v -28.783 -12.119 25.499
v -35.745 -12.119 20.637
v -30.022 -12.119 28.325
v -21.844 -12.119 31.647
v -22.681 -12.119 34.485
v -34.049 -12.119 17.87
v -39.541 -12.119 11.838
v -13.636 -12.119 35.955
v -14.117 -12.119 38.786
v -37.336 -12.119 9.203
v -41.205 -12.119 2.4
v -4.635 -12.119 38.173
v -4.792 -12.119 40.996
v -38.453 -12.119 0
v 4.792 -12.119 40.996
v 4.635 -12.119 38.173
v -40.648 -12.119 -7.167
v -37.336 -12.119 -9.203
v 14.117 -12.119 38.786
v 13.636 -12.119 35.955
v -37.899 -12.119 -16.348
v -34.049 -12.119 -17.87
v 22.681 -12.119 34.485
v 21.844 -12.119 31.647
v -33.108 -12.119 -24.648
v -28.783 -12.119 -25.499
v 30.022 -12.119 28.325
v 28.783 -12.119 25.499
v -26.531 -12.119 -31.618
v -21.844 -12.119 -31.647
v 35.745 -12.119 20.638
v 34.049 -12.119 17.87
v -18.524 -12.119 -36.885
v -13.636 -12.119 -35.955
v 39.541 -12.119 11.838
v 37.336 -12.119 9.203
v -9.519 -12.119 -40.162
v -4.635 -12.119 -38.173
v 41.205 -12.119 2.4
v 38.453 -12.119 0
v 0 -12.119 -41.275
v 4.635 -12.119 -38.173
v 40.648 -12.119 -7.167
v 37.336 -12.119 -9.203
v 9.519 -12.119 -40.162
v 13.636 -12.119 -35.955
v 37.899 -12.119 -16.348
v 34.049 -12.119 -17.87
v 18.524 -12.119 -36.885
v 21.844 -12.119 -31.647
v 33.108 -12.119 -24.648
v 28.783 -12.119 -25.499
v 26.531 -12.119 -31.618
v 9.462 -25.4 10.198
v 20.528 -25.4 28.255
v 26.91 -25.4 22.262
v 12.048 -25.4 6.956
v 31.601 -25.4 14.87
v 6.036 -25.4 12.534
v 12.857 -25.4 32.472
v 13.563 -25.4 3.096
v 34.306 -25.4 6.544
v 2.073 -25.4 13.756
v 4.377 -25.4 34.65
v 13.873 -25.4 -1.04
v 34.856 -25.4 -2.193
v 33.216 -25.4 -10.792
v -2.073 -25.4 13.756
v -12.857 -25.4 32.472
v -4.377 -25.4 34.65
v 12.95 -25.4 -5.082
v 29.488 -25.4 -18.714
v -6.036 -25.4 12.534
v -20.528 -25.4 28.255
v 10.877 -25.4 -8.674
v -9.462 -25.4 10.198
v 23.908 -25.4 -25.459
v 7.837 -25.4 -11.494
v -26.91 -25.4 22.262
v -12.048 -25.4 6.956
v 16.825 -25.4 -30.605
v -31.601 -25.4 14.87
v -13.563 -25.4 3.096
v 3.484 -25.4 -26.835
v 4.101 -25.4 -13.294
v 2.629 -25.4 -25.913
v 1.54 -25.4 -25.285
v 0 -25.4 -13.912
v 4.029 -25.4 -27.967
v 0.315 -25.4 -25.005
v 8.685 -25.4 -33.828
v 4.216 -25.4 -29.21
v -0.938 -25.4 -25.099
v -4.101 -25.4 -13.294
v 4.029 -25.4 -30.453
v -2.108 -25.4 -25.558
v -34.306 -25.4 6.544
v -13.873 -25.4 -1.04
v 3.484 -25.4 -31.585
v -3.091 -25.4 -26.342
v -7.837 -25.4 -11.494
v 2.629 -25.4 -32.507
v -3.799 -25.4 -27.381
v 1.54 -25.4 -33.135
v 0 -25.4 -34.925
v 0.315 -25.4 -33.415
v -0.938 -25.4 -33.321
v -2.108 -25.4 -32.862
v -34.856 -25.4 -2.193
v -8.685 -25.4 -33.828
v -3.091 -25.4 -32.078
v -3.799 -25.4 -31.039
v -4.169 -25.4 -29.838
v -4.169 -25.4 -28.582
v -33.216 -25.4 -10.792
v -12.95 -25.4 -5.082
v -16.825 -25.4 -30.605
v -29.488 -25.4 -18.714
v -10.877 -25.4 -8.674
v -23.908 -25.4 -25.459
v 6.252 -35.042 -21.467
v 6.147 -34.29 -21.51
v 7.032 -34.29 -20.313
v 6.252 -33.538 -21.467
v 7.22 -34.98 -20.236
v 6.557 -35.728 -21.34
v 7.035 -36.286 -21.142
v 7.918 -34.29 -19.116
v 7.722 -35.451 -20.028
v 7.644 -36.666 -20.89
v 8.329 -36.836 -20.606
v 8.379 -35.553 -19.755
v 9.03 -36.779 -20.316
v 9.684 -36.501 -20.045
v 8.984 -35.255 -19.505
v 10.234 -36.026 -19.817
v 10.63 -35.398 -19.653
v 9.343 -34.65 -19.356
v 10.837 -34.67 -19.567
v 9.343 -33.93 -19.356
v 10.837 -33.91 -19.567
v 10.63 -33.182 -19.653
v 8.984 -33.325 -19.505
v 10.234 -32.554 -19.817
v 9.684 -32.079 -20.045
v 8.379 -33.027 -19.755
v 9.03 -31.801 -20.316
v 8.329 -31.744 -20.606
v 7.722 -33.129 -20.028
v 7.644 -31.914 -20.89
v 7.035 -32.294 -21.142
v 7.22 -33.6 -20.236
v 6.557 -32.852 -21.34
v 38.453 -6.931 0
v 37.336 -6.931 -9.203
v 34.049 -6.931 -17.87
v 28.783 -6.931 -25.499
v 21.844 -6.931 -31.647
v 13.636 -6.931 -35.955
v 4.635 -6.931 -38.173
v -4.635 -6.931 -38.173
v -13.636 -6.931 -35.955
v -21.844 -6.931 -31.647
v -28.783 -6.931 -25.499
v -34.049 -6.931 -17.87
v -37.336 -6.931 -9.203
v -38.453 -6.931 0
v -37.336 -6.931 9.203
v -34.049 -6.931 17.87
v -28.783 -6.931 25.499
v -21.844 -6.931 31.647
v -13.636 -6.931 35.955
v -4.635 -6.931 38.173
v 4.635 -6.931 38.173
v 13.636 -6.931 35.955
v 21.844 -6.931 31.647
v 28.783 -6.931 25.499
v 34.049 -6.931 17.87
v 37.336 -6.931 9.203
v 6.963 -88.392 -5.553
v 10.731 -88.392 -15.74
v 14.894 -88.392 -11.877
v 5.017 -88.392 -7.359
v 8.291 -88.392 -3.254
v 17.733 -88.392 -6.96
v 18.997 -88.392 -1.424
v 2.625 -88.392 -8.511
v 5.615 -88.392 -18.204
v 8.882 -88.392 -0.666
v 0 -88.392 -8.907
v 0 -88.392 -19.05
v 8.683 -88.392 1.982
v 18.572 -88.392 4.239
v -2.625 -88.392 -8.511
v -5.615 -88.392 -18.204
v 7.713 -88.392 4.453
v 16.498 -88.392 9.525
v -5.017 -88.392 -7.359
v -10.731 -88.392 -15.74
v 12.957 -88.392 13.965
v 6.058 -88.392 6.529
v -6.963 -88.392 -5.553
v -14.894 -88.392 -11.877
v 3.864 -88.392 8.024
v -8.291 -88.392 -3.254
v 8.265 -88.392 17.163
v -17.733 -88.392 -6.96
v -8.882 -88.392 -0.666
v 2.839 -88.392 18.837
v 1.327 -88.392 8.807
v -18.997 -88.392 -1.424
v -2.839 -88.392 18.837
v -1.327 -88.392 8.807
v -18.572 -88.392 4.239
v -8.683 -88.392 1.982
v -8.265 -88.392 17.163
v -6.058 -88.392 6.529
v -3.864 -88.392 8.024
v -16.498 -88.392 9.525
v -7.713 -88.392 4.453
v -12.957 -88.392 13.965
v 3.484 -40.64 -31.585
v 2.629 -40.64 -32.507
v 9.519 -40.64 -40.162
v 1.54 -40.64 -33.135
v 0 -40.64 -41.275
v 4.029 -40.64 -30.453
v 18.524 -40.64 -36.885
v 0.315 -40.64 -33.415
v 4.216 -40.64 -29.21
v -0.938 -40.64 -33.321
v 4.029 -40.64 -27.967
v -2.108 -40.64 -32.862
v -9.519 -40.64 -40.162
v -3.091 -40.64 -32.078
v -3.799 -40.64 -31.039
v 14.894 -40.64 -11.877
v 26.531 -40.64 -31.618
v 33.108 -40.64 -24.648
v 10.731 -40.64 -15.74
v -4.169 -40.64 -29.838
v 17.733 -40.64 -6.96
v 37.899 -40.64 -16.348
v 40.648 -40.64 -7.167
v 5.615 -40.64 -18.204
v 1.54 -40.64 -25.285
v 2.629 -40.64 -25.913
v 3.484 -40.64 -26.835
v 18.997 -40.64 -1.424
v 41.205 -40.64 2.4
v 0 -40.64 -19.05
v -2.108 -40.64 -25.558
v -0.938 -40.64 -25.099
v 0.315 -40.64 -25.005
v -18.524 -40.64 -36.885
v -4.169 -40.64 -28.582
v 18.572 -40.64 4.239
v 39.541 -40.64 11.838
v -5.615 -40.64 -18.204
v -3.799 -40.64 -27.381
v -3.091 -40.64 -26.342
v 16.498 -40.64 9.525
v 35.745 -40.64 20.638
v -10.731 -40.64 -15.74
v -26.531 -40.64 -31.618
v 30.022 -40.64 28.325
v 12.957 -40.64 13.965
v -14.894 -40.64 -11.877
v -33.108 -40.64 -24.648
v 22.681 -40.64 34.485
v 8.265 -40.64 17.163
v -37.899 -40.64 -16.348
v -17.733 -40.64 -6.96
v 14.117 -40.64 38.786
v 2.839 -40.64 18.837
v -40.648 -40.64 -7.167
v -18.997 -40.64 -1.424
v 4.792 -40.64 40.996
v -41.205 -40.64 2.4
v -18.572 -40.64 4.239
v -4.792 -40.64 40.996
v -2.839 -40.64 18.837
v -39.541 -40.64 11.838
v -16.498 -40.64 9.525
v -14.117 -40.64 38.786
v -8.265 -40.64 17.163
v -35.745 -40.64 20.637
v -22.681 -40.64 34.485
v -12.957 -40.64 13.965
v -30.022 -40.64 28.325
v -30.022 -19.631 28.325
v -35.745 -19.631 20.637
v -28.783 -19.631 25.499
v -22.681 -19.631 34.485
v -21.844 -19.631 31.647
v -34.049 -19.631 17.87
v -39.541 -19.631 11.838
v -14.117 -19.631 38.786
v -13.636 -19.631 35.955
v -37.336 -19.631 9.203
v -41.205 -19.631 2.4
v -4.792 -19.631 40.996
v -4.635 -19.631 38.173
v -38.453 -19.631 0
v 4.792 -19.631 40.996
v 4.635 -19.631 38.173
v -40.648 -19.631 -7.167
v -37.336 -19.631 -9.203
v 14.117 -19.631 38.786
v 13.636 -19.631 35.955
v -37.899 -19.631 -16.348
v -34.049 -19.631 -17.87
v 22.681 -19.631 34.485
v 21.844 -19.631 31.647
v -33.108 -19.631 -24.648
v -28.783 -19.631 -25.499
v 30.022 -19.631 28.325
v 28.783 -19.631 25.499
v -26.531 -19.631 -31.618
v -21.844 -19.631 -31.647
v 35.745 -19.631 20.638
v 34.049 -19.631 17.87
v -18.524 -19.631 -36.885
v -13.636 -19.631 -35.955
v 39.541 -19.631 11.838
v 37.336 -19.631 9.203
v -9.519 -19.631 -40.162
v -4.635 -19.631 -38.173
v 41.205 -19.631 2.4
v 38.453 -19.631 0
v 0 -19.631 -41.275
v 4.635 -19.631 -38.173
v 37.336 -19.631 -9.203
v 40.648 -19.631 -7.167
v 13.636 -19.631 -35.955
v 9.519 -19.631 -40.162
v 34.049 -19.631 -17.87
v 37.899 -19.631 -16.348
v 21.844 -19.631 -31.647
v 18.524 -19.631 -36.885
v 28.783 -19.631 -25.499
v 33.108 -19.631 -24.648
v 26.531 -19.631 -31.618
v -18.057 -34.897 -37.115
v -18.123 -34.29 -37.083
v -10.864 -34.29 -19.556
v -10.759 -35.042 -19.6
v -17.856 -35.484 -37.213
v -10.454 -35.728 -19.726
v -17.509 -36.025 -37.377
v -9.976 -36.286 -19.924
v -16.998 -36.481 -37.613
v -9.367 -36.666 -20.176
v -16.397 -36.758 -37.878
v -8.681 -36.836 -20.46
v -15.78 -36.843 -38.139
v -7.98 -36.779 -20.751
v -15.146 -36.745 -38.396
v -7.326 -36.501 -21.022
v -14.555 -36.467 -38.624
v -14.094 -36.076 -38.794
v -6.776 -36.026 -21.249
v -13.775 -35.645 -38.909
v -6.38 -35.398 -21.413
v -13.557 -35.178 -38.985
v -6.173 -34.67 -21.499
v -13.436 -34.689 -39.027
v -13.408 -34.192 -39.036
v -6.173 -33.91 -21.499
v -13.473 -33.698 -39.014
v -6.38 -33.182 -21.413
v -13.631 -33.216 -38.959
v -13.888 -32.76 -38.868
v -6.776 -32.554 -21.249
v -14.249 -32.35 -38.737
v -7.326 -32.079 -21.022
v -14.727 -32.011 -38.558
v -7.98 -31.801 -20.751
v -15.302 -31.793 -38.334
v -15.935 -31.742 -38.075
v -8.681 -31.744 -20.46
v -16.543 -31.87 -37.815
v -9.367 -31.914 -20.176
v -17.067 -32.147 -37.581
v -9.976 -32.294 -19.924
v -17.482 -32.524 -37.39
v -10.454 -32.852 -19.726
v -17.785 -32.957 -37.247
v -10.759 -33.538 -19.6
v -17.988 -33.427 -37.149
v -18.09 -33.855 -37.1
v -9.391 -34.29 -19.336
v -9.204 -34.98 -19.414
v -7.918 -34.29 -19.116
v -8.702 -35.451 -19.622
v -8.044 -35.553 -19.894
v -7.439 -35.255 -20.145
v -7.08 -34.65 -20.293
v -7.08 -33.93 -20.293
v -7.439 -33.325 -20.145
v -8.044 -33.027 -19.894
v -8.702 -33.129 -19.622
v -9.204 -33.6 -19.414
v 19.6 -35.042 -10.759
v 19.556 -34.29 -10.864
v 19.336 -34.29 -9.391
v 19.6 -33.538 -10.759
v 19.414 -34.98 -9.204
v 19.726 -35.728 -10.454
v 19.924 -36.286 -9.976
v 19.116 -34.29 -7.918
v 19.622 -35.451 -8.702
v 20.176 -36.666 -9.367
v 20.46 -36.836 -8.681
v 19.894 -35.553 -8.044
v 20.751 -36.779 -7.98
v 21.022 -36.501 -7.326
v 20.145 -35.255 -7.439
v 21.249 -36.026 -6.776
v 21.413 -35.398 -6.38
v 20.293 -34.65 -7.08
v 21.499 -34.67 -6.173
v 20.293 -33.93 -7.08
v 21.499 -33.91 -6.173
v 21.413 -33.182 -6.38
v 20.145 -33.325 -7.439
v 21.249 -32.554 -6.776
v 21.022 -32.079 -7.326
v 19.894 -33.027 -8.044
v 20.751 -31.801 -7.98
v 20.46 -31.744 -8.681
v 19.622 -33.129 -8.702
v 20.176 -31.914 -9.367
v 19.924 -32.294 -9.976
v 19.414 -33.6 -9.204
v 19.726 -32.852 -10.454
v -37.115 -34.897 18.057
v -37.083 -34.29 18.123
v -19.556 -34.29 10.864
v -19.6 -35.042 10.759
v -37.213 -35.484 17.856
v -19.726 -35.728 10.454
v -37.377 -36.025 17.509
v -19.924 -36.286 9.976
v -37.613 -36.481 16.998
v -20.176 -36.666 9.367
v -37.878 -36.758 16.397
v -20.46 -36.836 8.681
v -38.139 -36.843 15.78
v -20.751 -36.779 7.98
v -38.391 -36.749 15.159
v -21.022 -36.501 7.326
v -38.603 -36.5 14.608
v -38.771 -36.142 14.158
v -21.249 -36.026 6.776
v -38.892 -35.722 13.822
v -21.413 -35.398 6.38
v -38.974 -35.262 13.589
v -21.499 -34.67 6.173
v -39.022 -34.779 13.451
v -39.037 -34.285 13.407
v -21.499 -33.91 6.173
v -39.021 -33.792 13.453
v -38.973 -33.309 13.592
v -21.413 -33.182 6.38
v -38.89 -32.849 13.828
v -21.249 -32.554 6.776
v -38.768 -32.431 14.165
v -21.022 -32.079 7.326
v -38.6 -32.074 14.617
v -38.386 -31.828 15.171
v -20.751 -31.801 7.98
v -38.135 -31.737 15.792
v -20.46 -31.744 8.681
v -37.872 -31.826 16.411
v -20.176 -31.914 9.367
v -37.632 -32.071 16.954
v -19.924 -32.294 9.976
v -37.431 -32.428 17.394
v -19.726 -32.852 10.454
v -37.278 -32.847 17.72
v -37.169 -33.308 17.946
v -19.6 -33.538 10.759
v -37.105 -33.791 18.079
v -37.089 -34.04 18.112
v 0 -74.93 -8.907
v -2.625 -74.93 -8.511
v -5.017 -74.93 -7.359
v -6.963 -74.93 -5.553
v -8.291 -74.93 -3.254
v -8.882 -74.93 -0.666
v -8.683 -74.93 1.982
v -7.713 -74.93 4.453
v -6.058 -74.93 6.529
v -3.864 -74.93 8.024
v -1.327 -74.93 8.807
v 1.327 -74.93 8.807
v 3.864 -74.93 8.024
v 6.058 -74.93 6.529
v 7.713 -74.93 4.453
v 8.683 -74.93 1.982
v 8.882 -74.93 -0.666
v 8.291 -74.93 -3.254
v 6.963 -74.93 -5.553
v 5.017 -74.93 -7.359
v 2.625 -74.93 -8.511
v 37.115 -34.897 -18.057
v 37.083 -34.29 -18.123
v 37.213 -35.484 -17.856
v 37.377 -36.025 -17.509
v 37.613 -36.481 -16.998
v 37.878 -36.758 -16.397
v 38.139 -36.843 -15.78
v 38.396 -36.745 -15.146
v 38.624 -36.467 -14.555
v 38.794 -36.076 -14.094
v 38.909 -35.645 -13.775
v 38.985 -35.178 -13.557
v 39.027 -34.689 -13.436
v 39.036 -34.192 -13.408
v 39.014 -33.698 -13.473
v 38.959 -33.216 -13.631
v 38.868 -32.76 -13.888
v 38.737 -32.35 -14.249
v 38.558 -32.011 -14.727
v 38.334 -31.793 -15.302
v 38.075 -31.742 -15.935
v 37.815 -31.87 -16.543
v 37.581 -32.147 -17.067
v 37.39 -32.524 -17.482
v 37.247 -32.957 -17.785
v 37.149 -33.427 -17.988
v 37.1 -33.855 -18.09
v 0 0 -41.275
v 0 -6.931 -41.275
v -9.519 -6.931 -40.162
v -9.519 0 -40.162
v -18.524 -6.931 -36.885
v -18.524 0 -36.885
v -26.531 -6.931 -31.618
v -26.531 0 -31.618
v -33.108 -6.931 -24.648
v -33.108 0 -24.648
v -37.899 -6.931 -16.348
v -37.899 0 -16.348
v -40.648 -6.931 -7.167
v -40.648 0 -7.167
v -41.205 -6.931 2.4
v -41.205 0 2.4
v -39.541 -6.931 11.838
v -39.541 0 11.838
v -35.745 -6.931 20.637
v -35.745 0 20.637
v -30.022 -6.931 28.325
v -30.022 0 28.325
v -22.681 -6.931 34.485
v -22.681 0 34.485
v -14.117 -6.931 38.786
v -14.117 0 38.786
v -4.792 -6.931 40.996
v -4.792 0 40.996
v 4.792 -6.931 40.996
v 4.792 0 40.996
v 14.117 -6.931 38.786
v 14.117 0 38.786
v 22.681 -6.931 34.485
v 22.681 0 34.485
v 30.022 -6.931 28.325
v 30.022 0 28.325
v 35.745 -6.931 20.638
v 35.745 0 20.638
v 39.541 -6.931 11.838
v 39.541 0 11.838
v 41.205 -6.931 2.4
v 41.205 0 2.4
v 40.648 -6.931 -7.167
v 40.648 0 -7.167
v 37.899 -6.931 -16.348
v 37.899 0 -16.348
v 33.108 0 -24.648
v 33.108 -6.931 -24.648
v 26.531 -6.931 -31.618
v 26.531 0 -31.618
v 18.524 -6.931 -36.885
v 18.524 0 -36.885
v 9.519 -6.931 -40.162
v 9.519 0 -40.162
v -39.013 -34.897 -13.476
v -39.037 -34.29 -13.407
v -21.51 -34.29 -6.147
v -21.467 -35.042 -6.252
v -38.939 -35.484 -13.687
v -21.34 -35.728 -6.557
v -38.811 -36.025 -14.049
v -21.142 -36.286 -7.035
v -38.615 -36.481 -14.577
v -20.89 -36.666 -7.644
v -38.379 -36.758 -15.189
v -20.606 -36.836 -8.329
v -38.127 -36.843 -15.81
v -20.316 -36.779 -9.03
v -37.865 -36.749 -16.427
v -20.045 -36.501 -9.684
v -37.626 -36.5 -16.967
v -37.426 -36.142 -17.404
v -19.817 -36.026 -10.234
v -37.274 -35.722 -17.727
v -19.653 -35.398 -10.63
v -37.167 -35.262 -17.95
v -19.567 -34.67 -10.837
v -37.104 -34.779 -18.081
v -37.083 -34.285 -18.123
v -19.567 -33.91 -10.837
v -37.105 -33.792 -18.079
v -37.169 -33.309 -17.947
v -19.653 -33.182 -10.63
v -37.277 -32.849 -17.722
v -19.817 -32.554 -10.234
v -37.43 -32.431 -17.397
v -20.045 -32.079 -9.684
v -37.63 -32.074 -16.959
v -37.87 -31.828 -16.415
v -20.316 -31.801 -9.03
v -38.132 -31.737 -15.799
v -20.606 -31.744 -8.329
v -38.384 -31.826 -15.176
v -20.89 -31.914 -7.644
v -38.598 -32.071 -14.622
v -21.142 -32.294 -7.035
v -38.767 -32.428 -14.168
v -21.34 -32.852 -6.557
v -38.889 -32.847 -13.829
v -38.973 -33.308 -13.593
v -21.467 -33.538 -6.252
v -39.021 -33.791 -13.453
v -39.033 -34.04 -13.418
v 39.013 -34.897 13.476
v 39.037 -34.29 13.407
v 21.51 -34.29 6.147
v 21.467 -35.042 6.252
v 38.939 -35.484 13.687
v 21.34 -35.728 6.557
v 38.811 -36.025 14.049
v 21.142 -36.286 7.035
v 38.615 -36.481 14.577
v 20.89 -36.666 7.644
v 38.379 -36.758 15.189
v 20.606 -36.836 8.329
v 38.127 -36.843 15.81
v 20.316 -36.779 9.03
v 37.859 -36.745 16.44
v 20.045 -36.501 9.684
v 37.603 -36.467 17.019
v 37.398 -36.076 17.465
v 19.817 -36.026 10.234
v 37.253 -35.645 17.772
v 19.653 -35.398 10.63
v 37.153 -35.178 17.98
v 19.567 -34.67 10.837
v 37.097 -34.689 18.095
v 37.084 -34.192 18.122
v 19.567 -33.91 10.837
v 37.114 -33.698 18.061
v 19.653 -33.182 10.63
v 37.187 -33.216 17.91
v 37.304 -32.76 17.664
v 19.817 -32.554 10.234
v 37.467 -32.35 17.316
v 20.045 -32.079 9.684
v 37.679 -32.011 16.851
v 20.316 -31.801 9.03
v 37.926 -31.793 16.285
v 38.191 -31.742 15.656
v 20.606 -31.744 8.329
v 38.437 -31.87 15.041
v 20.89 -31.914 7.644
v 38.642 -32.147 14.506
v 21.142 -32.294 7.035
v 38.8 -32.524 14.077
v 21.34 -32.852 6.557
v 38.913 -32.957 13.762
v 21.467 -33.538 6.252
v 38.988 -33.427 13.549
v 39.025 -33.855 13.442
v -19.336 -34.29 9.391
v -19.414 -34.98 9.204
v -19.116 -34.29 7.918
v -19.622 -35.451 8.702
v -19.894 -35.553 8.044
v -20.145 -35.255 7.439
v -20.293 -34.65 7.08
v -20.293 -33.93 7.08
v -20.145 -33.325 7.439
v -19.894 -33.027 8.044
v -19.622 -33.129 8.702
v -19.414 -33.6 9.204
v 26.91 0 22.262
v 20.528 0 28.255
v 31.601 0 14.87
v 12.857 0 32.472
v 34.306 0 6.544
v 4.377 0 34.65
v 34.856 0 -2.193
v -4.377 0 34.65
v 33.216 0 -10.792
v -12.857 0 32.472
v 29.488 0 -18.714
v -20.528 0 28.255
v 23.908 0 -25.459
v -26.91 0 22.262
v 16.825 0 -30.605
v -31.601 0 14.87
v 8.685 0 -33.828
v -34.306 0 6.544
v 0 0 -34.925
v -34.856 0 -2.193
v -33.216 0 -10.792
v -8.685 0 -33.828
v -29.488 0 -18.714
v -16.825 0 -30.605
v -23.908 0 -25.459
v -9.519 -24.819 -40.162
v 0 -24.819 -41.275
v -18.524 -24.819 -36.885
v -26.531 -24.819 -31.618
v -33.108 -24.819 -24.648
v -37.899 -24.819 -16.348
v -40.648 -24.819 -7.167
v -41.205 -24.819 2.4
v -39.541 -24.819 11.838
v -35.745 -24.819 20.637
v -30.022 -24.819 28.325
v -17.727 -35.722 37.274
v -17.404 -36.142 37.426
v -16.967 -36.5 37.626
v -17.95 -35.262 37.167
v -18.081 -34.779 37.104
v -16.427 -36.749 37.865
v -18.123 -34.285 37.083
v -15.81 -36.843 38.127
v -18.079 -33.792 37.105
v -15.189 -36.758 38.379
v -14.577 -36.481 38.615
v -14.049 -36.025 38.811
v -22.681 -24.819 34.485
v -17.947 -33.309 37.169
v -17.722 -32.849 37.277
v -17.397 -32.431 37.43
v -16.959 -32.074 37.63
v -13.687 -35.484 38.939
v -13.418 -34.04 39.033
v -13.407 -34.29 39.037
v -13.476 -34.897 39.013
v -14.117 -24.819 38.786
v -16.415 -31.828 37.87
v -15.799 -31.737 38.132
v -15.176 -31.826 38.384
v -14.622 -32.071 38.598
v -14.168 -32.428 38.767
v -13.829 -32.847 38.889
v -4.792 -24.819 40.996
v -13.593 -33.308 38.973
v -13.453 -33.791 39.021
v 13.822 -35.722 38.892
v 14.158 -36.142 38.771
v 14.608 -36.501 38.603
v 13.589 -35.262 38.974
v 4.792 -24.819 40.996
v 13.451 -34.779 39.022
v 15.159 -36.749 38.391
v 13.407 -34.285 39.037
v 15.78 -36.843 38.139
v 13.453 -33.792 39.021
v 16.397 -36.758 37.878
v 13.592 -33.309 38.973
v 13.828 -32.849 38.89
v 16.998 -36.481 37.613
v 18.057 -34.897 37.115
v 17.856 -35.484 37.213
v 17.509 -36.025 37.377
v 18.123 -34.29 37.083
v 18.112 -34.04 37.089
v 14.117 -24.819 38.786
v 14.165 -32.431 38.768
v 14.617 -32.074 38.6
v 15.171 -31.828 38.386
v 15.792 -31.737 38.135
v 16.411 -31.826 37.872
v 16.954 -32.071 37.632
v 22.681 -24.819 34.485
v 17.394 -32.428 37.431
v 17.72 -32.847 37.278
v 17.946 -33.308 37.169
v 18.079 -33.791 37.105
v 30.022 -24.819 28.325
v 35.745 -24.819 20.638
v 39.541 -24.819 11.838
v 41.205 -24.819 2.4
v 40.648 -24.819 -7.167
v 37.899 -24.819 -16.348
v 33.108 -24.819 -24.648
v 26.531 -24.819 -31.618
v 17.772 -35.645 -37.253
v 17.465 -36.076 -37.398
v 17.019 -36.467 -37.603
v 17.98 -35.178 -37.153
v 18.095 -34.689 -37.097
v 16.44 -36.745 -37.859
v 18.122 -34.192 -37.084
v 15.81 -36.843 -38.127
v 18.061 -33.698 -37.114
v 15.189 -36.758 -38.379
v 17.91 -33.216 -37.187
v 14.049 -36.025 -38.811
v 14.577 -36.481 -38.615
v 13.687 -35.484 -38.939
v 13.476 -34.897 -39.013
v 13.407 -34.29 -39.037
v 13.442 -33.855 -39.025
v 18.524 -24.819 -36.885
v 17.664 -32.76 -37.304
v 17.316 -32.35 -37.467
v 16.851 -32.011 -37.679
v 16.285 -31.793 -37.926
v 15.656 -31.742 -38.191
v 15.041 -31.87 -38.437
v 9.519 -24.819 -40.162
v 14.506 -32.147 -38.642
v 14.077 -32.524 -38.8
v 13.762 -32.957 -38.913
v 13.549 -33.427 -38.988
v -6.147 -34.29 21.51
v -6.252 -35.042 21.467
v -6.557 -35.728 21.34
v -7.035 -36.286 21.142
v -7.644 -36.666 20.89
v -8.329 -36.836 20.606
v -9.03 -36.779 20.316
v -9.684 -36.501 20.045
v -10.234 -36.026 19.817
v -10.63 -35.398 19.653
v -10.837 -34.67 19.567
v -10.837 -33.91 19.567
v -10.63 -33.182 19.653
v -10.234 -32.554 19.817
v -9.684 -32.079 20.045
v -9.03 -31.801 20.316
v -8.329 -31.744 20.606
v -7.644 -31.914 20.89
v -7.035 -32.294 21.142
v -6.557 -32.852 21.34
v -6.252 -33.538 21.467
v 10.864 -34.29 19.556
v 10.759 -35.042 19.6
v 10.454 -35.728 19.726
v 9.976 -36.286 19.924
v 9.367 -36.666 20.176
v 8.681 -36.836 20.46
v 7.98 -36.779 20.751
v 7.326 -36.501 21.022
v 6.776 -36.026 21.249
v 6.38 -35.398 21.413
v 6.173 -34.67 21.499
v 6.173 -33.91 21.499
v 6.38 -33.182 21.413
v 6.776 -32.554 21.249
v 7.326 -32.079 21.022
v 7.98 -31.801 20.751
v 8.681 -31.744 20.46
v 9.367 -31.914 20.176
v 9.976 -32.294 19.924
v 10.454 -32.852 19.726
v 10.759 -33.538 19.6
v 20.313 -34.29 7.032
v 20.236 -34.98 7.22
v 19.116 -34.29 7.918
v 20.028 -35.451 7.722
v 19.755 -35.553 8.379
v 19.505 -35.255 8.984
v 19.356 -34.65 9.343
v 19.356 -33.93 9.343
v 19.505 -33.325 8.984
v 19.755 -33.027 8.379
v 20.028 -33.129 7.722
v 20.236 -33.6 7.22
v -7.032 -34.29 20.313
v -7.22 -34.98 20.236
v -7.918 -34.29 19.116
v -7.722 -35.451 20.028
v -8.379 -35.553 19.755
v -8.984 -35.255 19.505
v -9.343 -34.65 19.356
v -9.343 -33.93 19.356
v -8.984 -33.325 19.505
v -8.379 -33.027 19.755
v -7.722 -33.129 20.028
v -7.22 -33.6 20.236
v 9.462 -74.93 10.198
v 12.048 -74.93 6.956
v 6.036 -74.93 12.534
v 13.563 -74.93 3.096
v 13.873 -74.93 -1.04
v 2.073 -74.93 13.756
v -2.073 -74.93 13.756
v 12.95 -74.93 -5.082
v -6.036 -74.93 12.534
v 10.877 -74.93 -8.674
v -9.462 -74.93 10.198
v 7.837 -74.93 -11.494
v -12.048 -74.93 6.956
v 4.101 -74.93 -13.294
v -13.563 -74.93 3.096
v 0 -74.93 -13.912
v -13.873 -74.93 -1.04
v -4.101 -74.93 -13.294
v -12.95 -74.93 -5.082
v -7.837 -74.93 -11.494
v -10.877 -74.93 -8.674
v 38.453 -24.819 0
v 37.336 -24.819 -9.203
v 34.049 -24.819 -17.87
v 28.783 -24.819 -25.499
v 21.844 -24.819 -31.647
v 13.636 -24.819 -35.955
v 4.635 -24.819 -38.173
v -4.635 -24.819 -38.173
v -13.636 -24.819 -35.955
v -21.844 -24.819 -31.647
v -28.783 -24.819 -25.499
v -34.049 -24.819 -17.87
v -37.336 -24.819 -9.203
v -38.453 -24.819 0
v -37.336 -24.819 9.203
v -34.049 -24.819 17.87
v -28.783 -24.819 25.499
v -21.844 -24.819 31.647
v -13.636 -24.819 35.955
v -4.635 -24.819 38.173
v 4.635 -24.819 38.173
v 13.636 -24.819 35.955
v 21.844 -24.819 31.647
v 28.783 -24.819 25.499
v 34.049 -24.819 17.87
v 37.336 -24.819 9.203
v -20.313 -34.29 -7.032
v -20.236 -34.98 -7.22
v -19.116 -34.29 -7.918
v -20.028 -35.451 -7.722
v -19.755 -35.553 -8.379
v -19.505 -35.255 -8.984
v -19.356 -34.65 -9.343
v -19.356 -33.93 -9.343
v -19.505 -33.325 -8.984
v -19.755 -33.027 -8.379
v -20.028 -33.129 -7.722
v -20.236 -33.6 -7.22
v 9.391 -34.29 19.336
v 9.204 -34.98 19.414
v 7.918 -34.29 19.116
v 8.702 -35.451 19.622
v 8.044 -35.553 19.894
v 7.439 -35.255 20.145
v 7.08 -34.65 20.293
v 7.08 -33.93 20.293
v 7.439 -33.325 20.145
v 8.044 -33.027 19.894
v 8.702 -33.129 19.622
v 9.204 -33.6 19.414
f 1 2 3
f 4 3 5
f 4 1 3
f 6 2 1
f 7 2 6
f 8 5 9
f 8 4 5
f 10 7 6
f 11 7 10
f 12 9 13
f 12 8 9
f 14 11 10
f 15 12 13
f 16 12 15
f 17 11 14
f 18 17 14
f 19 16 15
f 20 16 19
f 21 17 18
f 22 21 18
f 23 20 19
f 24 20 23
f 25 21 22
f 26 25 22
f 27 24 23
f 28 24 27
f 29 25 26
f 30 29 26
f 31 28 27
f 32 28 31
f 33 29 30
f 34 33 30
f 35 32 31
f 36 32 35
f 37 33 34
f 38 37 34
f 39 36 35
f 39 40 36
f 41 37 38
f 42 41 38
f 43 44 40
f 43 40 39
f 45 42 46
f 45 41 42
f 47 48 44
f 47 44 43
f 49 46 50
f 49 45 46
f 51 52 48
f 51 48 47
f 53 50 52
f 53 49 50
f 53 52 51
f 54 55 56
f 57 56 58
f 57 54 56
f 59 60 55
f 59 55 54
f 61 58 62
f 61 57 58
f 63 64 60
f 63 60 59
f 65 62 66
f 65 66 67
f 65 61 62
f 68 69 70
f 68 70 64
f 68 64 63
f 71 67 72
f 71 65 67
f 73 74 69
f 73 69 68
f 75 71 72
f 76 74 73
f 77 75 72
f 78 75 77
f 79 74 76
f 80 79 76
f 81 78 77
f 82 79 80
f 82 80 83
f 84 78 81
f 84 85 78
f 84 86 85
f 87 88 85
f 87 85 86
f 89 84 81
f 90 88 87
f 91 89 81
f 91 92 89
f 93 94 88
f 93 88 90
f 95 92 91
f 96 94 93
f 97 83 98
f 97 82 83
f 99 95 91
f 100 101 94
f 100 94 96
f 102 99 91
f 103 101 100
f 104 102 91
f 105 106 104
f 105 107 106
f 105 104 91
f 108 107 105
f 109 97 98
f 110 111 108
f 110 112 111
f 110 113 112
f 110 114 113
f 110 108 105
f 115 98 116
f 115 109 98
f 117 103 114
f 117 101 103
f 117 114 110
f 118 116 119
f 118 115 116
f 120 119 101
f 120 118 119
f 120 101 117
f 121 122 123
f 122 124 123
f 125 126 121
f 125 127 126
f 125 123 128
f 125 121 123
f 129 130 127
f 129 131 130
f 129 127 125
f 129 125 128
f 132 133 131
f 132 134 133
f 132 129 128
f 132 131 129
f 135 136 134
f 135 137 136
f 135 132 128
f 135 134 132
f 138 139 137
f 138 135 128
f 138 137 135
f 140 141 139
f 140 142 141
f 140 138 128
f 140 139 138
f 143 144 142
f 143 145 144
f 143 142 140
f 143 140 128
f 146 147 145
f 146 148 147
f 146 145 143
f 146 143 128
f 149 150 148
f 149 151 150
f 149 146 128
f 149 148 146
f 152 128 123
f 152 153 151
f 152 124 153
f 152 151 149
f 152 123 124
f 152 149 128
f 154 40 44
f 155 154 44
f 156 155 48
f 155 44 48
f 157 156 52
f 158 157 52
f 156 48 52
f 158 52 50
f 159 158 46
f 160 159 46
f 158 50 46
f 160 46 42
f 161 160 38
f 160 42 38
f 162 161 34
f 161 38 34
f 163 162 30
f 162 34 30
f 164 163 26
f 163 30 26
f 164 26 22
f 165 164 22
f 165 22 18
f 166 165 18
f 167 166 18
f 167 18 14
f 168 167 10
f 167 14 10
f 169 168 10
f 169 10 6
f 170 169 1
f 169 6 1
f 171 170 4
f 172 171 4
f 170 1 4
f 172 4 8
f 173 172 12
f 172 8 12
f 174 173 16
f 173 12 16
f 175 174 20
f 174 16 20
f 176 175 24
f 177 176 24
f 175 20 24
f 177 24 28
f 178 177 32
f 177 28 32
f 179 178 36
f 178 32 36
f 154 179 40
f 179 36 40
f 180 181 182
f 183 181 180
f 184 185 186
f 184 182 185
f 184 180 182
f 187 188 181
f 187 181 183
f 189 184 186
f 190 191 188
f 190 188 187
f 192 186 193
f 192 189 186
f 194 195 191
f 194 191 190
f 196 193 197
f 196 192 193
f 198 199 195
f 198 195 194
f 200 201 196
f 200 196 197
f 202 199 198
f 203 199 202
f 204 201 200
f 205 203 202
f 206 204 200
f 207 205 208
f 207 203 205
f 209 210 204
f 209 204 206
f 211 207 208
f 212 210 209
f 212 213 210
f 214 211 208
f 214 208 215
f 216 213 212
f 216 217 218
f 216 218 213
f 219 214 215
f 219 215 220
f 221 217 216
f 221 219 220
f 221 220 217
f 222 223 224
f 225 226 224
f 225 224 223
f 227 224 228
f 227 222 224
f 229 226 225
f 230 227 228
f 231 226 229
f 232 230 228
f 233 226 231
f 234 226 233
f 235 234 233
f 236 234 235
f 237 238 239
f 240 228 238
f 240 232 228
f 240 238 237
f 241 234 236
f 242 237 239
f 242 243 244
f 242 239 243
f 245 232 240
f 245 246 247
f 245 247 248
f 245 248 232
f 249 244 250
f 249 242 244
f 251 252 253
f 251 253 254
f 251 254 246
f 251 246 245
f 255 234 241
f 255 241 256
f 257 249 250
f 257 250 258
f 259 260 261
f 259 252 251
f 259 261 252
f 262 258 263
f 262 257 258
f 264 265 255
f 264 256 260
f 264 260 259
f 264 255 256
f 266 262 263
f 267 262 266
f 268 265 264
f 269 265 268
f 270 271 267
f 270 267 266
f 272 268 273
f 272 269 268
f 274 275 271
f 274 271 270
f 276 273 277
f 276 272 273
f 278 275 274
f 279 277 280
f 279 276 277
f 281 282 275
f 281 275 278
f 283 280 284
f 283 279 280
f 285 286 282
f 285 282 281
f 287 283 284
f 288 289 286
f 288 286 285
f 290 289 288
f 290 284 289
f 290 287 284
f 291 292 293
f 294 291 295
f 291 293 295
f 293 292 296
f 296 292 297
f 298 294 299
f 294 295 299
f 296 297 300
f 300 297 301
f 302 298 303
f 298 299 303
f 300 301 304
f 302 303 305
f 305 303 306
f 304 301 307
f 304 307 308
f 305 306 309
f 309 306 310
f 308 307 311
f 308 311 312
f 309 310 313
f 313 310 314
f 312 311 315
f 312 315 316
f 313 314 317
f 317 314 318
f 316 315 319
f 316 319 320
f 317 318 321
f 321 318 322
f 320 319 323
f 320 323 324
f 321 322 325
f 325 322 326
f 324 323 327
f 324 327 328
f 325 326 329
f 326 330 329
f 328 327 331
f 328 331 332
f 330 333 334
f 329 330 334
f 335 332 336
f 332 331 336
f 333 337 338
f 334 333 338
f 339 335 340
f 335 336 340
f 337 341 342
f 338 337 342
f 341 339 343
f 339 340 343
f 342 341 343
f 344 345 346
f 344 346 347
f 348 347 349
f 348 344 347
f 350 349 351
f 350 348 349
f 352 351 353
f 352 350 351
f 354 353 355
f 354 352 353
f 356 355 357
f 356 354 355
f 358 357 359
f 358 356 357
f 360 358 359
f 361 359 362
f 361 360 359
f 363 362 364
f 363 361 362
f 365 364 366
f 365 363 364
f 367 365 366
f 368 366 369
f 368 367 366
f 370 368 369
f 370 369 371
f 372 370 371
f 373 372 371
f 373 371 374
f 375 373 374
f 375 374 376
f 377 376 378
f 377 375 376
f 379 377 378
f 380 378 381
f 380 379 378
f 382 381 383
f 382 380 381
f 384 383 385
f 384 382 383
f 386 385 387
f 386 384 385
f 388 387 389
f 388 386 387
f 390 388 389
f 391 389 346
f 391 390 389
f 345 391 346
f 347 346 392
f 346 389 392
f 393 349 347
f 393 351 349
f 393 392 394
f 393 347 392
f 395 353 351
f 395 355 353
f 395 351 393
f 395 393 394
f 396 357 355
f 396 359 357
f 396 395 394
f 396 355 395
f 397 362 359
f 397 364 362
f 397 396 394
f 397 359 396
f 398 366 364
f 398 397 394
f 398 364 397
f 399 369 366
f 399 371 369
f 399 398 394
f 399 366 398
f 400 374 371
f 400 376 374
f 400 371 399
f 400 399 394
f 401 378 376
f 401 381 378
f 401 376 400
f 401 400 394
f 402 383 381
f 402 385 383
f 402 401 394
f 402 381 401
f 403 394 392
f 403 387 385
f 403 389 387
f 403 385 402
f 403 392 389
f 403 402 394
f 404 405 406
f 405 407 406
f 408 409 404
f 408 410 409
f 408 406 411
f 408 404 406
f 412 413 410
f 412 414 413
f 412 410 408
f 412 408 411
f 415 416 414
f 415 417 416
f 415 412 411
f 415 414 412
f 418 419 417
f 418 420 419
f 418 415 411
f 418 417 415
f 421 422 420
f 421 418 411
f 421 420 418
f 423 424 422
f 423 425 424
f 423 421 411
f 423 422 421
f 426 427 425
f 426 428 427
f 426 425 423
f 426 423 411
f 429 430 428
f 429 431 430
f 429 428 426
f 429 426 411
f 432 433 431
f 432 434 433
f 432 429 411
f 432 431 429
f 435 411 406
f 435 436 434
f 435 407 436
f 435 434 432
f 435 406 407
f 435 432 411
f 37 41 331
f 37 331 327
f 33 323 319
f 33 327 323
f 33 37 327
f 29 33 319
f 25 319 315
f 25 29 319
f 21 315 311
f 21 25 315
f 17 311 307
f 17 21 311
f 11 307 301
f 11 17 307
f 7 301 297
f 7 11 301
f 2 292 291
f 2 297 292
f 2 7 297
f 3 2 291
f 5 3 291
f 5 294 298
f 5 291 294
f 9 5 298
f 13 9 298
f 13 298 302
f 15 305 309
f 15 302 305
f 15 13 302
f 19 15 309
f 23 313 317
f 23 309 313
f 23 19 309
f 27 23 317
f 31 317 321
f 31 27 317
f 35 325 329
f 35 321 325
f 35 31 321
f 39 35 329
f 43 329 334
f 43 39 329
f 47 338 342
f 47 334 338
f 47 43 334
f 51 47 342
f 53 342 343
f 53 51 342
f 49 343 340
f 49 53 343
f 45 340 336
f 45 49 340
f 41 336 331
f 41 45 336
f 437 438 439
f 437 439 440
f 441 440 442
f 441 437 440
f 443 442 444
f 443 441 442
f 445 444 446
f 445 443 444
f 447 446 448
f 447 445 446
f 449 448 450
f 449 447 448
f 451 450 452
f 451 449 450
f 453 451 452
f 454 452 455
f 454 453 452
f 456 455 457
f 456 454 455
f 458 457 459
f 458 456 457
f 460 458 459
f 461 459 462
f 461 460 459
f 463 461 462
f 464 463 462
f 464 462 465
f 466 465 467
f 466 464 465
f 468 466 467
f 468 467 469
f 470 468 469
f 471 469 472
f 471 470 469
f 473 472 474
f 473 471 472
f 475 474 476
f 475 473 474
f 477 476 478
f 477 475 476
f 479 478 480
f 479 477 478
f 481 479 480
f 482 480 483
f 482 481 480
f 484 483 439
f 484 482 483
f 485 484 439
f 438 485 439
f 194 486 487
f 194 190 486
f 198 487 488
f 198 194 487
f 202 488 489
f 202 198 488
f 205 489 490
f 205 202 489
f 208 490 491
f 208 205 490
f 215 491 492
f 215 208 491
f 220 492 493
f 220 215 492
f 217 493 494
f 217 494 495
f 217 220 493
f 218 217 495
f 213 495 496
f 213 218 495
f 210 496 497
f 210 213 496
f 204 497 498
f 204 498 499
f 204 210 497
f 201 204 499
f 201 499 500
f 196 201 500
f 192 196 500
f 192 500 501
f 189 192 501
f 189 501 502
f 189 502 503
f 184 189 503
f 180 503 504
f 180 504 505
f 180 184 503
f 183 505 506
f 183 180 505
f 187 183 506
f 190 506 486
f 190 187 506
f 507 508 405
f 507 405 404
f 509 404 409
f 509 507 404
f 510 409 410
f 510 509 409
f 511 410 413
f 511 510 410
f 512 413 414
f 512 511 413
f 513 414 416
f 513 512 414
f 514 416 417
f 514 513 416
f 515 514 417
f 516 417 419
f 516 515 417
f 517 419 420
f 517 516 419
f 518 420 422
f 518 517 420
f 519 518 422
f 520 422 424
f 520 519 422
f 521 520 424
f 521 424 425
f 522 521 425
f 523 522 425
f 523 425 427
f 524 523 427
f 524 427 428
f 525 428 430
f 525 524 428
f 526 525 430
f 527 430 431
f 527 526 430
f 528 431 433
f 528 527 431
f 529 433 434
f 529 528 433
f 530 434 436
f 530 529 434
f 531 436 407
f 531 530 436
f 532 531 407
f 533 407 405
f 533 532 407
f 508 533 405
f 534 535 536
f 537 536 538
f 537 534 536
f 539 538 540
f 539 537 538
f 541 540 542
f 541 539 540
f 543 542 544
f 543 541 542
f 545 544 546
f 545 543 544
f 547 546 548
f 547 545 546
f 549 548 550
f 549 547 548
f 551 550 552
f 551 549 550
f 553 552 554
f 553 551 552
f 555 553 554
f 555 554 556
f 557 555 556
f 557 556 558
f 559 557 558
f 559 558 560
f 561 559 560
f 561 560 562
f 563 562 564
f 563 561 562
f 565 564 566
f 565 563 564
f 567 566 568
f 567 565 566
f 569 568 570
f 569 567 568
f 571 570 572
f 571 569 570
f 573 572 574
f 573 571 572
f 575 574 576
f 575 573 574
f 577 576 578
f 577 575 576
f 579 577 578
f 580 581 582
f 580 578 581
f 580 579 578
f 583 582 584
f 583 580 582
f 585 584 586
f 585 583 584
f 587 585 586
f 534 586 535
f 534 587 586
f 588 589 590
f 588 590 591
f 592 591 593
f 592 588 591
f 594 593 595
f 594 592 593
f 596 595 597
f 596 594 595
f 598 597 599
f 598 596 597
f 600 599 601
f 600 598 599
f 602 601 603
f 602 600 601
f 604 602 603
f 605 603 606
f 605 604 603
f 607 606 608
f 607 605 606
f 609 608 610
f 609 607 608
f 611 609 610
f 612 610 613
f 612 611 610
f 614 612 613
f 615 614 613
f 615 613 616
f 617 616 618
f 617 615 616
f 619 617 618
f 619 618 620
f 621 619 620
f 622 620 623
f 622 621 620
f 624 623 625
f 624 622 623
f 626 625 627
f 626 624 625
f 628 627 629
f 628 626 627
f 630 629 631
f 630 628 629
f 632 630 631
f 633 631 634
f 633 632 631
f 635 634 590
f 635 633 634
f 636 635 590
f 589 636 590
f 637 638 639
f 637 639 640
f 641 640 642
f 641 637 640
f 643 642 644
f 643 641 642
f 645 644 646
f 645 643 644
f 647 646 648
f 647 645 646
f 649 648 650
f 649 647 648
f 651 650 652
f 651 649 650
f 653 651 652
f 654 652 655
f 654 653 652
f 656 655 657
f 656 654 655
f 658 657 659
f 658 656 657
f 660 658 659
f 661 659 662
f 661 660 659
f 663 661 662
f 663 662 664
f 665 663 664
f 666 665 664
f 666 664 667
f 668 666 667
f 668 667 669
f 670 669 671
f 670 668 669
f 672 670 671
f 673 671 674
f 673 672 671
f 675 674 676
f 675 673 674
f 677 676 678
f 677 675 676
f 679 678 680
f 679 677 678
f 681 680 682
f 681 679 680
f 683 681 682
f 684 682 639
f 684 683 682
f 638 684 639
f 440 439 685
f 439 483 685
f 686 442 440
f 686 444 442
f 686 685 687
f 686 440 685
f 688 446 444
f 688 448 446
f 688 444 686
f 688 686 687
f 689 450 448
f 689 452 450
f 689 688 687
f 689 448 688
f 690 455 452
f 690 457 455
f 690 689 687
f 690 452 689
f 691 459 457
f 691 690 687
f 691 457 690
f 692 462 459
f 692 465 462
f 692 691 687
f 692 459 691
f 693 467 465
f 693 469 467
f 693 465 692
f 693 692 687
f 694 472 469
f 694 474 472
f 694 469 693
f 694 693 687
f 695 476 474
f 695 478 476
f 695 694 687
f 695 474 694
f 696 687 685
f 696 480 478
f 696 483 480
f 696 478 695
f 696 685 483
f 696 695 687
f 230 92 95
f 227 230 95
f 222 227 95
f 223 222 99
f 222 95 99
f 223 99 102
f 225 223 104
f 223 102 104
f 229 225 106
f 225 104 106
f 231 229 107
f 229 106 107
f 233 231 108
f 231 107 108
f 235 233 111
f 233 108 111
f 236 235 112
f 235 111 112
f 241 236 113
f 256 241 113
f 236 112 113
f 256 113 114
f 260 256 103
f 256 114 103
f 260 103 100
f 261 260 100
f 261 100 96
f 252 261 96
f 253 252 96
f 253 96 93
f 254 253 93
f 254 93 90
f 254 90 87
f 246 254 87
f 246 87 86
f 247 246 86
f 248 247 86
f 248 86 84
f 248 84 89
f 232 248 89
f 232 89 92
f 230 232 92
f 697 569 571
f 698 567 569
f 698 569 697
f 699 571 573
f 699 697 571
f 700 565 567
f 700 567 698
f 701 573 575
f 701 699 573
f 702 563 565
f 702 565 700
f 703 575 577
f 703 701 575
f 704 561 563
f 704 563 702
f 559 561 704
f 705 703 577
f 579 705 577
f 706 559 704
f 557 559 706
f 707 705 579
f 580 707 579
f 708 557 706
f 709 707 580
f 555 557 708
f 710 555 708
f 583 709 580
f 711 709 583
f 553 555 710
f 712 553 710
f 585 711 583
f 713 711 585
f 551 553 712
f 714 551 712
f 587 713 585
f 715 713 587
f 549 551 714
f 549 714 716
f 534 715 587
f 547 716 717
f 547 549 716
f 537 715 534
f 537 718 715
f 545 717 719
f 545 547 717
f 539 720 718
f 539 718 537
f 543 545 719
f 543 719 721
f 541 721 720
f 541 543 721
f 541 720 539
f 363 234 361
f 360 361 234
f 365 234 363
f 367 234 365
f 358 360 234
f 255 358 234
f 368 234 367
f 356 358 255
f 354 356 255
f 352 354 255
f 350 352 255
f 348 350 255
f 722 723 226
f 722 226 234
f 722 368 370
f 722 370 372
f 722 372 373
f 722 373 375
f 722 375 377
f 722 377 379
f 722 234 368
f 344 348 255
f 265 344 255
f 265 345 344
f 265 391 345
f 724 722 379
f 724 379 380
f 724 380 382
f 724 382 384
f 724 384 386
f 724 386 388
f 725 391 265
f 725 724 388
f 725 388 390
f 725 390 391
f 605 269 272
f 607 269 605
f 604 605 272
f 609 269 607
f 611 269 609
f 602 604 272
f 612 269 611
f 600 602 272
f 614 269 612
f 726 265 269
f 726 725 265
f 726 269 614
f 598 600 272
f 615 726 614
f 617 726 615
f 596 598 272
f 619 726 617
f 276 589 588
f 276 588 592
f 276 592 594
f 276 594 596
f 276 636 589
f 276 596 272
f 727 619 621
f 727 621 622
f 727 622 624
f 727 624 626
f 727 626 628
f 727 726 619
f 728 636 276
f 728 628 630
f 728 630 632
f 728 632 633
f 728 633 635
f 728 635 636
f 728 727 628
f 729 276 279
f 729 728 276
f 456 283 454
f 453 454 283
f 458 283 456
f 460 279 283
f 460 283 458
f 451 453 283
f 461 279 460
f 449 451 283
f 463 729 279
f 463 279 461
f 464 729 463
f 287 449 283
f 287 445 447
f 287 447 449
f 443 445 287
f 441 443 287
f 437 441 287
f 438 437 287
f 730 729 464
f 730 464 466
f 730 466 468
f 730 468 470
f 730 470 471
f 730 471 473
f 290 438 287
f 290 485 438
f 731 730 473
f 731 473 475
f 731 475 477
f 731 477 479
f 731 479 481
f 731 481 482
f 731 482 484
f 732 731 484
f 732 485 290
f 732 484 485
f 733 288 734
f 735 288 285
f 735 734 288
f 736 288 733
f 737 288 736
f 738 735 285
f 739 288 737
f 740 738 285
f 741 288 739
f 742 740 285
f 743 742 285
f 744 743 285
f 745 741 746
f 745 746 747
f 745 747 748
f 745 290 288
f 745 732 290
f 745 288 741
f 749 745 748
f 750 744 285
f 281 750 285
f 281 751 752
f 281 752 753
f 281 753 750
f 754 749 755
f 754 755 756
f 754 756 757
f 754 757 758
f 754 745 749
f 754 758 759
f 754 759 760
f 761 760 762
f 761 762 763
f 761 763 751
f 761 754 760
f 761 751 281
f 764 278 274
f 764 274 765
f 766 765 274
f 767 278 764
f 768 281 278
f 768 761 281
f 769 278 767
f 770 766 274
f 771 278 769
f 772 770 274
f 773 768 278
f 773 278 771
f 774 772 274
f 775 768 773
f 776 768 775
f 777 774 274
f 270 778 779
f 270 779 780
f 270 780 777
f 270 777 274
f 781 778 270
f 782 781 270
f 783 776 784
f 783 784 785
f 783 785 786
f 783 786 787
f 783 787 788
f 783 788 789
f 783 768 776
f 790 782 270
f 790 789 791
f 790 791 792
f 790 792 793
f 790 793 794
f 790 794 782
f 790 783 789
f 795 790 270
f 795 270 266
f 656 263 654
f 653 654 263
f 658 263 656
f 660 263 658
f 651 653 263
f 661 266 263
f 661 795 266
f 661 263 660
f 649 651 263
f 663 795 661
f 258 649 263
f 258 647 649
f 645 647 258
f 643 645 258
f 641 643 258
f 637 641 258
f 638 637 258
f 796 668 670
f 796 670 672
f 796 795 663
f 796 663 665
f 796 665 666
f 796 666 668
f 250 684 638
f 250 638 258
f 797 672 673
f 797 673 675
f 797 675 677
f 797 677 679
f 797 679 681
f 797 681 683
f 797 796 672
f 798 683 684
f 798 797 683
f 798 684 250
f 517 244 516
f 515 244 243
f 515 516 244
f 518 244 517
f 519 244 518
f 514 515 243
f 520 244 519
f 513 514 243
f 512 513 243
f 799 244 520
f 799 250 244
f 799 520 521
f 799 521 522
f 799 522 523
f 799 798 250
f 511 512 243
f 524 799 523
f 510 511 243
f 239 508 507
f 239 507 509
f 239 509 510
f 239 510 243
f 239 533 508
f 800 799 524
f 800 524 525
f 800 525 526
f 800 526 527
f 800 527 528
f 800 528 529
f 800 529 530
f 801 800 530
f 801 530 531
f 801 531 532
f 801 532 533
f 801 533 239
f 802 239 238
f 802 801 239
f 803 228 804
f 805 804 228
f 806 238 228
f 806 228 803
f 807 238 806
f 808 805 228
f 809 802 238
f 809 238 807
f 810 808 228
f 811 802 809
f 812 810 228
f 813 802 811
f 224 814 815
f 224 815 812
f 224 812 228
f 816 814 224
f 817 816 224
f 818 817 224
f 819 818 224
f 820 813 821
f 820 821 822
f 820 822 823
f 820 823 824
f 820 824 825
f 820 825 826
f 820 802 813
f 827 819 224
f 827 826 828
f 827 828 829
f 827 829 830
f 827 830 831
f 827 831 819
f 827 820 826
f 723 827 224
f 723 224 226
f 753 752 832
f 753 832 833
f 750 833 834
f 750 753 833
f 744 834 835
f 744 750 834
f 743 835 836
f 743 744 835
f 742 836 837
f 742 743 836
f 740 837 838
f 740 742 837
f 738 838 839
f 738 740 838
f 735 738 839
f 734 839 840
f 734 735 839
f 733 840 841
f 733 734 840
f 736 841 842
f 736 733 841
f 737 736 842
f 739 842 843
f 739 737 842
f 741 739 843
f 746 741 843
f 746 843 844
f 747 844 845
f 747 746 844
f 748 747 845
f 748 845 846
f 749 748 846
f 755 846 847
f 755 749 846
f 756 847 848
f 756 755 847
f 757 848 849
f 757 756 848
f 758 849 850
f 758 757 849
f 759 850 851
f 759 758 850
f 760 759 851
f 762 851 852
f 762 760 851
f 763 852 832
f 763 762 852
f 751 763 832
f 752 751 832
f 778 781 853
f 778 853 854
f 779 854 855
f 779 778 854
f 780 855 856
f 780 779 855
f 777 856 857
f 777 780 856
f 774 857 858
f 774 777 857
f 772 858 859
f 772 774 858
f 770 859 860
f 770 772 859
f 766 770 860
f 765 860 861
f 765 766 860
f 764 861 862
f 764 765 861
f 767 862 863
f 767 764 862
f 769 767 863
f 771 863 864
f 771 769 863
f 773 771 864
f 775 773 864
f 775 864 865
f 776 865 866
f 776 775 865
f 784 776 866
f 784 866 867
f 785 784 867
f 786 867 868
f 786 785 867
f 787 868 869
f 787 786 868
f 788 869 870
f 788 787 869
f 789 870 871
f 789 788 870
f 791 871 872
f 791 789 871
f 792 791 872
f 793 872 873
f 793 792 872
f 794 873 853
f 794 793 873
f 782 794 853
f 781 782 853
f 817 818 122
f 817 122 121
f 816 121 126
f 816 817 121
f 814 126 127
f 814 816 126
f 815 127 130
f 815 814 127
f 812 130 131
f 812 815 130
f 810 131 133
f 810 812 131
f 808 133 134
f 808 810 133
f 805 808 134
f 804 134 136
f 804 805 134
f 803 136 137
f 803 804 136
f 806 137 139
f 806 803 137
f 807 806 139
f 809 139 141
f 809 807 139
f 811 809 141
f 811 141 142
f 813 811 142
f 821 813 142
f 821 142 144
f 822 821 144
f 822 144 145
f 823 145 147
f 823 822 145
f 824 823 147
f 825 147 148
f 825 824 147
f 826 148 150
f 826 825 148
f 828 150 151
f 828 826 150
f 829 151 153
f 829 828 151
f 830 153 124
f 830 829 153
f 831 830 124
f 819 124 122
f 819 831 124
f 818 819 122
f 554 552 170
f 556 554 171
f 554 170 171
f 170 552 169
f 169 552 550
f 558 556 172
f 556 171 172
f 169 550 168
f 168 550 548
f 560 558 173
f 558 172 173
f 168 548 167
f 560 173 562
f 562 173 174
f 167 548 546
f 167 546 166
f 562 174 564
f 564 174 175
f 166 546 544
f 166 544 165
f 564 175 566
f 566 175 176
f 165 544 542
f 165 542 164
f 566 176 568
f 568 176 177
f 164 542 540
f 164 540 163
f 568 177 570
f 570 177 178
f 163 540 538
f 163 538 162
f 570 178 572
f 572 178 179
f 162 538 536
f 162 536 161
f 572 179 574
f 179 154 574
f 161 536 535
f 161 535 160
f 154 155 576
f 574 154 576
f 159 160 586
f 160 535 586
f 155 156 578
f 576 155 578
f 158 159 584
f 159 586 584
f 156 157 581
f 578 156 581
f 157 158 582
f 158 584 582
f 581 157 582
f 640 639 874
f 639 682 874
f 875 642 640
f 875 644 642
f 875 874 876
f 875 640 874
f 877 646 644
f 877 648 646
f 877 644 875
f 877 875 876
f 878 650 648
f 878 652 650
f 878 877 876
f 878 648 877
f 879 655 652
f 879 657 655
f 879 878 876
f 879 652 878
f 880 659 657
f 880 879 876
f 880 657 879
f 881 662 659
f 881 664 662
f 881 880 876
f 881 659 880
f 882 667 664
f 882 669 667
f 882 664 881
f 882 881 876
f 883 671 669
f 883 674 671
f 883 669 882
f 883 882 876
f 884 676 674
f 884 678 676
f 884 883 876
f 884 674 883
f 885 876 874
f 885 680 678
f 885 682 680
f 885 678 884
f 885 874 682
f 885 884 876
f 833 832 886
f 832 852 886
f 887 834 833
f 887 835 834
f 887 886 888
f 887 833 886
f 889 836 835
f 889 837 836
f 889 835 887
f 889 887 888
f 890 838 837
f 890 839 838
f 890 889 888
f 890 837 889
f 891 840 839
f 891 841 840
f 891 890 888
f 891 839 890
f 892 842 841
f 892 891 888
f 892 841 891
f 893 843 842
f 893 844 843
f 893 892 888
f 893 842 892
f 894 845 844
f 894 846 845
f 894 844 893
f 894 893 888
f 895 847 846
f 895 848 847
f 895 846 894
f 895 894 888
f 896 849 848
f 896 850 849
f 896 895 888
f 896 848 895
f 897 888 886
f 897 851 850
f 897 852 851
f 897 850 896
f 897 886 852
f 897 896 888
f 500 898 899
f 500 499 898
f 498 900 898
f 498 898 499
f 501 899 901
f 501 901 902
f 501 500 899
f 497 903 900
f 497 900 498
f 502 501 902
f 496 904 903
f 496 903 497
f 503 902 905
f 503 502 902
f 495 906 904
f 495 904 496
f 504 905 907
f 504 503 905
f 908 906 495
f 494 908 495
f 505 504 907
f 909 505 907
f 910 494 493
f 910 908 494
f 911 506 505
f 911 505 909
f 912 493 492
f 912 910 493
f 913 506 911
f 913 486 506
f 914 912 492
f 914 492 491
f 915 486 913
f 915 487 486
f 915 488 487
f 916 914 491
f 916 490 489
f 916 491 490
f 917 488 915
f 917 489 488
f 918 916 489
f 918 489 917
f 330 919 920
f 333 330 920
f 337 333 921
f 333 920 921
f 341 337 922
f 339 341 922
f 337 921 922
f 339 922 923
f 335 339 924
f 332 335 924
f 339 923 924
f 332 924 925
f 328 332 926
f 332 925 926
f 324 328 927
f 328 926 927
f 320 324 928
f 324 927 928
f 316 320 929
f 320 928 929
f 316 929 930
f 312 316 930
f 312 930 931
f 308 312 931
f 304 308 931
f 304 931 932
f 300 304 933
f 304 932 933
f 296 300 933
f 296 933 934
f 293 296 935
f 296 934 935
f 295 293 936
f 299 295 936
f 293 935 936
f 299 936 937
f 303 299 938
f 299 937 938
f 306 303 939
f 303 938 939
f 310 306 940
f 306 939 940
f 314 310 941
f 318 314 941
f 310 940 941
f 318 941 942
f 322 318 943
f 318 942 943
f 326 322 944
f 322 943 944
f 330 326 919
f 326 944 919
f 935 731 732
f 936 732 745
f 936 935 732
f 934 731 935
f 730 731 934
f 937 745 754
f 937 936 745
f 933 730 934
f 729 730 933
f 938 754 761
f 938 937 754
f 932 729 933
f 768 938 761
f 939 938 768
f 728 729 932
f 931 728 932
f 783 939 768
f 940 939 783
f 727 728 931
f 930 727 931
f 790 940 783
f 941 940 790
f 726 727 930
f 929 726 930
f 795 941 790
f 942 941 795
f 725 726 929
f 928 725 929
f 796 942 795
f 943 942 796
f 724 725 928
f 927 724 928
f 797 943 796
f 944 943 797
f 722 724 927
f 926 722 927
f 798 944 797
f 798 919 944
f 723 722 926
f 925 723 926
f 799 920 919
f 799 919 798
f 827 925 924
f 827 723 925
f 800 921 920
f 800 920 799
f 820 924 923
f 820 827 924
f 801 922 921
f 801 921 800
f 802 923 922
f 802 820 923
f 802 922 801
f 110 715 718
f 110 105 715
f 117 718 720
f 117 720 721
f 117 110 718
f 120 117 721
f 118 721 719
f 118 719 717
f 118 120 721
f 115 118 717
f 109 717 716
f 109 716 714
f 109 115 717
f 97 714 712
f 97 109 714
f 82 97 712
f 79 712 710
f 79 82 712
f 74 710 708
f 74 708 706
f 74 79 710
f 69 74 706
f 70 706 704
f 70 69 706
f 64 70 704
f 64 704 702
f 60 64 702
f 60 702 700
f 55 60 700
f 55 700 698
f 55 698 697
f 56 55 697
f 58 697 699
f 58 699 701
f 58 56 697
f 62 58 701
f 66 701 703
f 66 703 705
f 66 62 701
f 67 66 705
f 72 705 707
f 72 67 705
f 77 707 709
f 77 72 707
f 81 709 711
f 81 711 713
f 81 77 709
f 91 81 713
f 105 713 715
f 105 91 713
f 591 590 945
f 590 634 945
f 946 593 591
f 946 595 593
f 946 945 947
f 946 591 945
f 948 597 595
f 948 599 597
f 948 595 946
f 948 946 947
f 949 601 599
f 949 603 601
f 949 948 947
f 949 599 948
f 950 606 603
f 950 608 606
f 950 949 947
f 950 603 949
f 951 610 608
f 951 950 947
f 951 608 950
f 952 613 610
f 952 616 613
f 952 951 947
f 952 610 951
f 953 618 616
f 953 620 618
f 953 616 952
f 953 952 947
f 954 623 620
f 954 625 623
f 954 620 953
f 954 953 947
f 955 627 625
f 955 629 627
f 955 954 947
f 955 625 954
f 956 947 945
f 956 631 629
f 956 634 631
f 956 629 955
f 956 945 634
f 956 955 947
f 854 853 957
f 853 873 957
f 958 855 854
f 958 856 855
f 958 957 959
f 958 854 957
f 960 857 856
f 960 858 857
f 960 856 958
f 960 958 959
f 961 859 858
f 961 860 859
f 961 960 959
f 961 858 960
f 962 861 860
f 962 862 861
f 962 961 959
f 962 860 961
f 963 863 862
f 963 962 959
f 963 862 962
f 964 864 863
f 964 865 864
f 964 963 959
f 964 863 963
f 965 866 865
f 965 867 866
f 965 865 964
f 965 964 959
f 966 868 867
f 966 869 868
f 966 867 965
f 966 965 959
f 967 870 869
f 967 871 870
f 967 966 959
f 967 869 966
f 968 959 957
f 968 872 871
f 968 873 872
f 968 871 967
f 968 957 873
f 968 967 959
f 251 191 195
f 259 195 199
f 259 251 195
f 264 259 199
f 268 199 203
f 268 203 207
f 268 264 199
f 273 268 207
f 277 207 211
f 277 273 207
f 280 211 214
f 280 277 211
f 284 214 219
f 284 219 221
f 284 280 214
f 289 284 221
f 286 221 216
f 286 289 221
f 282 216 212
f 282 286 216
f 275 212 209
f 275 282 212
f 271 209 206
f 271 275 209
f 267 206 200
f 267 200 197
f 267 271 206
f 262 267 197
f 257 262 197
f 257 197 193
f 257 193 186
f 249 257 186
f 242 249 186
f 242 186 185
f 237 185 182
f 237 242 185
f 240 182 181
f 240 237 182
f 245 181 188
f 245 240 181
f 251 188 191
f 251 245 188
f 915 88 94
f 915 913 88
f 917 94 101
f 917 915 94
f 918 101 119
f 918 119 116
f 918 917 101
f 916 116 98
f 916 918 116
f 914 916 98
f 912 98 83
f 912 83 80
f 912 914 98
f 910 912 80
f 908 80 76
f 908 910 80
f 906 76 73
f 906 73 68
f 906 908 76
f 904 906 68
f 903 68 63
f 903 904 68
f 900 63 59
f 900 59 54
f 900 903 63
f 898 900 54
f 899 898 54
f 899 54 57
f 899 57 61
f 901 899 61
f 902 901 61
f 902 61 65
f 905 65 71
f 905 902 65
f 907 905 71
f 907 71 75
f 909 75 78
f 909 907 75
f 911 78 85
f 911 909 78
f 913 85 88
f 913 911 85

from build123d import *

# Parameters (mm, degrees)
CIRPATTERN1_COUNT        = 8
LPATTERN1_START          = -24.818843944
LPATTERN1_OUTLINE_R      = 41.275
LPATTERN1_OUTLINE_R_2    = 38.453474767
LPATTERN1_DEPTH          = 5.187687888
LPATTERN1_START_2        = -12.118843944
LPATTERN1_2_OUTLINE_R    = 41.275
LPATTERN1_2_OUTLINE_R_2  = 38.453474767
LPATTERN1_2_DEPTH        = 5.187687888
Q_0_332_DIAMETER_HOLE1_D = 8.4328


# Read off the part's stored shape, not the designer's step: LPattern1
with BuildPart() as part:
    # Sketch1 → Revolve1 (revolve)
    with BuildSketch(Plane.XY, mode=Mode.PRIVATE) as revolve1_sk:
        Polygon((-41.275, -40.64), (-41.275, 0), (-34.925, 0), (-34.925, -25.4), (-13.91158, -25.4), (-13.91158, -74.93), (-8.90651, -74.93), (-8.90651, -88.392), (-19.05, -88.392), (-19.05, -40.64), align=None)
    revolve(revolve1_sk.sketch.rotate(Axis((0, 0, 0), (0, 1, 0)), 270), axis=Axis((0, 0, 0), (0, 1, 0)))

    # Sketch8 → 1/4-20 Tapped Hole1 (revolve, cut)
    with BuildSketch(Plane(origin=(38.133127704, -34.29, -15.795258671), x_dir=(-0.38268343236509045, 0, -0.9238795325112865), z_dir=(0, 1, 0))):
        Polygon((0, 0), (0, 20.583816902), (2.5527, 19.05), (2.5527, 0), align=None)
    f_1_4_20_tapped_hole1 = revolve(axis=Axis((43.999762736, -34.29, -18.225298466), (-0.9238795325112865, 0, 0.38268343236509045)), mode=Mode.SUBTRACT)

    # CirPattern1: 1/4-20 Tapped Hole1 ×8 about axis
    cirpattern1_axis = Axis((0, -118.183018713, 0), (0, 1, 0))
    for i in range(1, CIRPATTERN1_COUNT):
        add(f_1_4_20_tapped_hole1.rotate(cirpattern1_axis, i * 360 / CIRPATTERN1_COUNT), mode=Mode.SUBTRACT)

    # LPattern1 outline → LPattern1 (cut)
    with BuildSketch(Plane(origin=(0, 0, 0), x_dir=(1, 0, 0), z_dir=(0, 1, 0)).offset(LPATTERN1_START)):
        Circle(LPATTERN1_OUTLINE_R)
        Circle(LPATTERN1_OUTLINE_R_2, mode=Mode.SUBTRACT)
    extrude(amount=LPATTERN1_DEPTH, mode=Mode.SUBTRACT)

    # LPattern1 2 outline → LPattern1 2 (cut)
    with BuildSketch(Plane(origin=(0, 0, 0), x_dir=(1, 0, 0), z_dir=(0, 1, 0)).offset(LPATTERN1_START_2)):
        Circle(LPATTERN1_2_OUTLINE_R)
        Circle(LPATTERN1_2_OUTLINE_R_2, mode=Mode.SUBTRACT)
    extrude(amount=LPATTERN1_2_DEPTH, mode=Mode.SUBTRACT)

    # Q (0.332) Diameter Hole1 (through all)
    with Locations(Plane(origin=(0, -40.64, 0), x_dir=(-1, 0, 0), z_dir=(0, -1, 0))):
        with Locations((0, 29.21)):
            Hole(Q_0_332_DIAMETER_HOLE1_D / 2)


solid = part.part
